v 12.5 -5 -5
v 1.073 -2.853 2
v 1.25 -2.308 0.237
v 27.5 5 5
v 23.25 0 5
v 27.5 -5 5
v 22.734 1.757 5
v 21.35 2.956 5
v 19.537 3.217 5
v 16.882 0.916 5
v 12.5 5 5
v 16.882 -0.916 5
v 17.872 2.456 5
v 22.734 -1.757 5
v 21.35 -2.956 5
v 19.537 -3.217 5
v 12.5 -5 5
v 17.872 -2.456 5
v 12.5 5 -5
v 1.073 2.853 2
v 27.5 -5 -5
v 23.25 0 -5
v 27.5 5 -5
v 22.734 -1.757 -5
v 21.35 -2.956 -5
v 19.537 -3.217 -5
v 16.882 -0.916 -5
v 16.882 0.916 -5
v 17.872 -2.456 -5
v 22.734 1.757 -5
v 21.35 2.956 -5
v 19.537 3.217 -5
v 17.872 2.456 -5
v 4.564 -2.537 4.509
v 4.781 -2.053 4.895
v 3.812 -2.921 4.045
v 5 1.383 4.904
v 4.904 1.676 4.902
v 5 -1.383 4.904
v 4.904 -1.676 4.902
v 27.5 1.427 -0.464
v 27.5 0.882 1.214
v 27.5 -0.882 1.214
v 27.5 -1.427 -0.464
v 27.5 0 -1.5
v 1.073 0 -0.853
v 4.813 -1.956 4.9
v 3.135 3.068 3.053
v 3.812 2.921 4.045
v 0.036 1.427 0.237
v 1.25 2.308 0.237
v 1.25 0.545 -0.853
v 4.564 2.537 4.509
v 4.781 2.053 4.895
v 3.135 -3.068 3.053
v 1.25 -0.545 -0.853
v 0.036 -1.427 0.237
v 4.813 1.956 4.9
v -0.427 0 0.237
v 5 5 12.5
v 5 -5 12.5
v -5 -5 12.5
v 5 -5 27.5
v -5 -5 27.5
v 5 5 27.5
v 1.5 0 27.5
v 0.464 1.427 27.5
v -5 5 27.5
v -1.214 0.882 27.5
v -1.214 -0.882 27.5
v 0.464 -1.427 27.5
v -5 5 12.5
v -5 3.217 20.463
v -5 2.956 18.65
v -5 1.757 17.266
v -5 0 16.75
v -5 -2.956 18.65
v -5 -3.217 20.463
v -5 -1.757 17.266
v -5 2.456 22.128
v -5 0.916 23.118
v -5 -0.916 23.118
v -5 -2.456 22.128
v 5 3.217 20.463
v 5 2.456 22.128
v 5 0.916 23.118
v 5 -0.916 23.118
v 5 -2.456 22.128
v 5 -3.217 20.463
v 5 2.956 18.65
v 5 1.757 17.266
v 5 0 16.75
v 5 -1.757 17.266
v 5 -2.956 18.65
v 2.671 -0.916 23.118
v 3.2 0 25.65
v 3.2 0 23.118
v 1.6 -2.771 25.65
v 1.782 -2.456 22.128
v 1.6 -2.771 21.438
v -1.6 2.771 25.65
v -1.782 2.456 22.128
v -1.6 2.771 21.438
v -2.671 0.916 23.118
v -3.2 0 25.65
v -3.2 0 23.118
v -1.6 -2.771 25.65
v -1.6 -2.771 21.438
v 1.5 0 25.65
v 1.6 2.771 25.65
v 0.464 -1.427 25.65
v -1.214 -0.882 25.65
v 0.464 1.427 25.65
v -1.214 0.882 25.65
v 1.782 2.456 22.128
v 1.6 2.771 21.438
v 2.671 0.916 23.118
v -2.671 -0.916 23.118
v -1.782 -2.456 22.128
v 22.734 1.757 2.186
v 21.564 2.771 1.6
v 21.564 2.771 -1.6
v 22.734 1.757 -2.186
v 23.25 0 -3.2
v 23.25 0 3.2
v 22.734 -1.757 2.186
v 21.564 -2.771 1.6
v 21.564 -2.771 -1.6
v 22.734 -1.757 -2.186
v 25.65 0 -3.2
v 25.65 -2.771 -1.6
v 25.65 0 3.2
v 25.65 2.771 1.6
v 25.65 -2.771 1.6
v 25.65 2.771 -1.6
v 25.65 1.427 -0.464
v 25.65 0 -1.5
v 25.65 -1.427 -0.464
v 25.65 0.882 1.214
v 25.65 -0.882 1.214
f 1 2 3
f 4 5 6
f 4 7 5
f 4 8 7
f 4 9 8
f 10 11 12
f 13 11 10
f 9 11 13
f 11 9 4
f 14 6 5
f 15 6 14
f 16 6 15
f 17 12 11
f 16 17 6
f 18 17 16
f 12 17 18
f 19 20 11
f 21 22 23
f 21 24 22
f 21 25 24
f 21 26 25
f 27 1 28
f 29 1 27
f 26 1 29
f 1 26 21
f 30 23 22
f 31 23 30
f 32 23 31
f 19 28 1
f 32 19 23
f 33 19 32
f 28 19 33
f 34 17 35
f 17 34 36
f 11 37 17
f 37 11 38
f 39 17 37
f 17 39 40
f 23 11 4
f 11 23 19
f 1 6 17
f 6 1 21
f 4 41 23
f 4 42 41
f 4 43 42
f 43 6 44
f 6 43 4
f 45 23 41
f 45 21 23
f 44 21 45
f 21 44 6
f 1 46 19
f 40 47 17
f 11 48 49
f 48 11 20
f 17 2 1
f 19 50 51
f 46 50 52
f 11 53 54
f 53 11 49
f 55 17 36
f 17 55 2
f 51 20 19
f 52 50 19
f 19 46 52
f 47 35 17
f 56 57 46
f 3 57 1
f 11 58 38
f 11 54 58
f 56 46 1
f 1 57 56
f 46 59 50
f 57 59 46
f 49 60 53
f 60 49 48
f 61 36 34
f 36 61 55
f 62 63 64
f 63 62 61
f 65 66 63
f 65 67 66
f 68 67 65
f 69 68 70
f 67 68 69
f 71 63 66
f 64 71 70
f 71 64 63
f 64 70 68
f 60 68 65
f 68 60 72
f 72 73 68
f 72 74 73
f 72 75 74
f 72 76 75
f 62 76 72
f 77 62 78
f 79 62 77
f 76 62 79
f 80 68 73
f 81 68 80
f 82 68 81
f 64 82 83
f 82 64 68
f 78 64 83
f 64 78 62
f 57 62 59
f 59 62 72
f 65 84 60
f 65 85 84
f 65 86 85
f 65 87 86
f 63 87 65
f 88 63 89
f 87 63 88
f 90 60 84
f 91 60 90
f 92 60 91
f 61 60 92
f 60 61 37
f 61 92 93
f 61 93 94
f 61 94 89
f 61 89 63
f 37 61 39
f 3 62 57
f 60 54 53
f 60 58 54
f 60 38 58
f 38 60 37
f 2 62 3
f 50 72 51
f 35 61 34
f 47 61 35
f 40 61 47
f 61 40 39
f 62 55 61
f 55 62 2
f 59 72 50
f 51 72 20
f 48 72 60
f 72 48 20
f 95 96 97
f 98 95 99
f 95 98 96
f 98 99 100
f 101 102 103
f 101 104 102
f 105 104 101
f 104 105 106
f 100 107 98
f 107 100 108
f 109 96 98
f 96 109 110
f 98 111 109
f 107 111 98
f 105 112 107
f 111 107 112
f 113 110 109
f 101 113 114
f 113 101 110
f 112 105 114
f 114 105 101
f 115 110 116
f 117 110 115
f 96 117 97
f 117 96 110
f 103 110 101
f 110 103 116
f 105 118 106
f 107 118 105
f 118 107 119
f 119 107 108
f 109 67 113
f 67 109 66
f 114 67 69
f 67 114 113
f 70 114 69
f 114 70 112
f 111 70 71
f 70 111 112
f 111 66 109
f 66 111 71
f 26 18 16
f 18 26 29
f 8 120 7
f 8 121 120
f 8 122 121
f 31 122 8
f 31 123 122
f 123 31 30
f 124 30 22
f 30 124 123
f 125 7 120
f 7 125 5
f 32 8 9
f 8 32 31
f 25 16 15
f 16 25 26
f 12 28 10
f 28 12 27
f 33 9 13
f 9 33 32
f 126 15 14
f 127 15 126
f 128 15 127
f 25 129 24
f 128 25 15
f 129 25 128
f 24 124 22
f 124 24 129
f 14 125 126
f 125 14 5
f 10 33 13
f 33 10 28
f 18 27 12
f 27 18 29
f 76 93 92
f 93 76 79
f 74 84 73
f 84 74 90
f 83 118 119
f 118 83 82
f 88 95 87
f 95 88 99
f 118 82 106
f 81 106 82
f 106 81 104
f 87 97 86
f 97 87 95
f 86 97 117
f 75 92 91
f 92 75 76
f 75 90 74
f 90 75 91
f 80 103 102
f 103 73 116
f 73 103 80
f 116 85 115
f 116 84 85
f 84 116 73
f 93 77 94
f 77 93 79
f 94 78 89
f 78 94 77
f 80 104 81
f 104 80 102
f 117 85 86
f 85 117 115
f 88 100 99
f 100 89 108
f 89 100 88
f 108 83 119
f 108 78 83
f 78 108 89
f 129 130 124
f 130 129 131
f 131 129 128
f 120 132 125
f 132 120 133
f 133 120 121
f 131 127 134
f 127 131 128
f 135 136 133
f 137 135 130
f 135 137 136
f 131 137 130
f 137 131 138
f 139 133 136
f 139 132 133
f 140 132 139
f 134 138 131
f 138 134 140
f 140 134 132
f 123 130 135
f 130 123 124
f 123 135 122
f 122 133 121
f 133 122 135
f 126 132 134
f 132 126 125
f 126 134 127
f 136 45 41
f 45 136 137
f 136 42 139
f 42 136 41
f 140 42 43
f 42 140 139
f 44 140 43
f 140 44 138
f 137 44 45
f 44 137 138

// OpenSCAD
use <MCAD/nuts_and_bolts.scad>

guiding_length = 10;
x = 2;
space = 15;


difference(){
union(){
	hull(){
	translate([space +guiding_length/2,0,0]) cube(size=[15,10,guiding_length], center = true);
	translate([x, 0, x]) sphere(3);
	}

	hull(){
		translate([0,0,space+guiding_length/2]) rotate([0,90,0])cube(size=[15,10,guiding_length], center = true);
		translate([x, 0, x]) sphere(3);
	}
}

	translate([space +guiding_length/2,0,0]) cylinder(r=3.25, h=10*guiding_length, center = true);
	translate([0,0,space+guiding_length/2]) rotate([0,90,0])cylinder(r=3.25, h=10*guiding_length, center = true);

//space for nut
	rotate([0,-90,0])
union(){translate([space +guiding_length/2+4.5,0, 0]) rotate([0,90,0]) translate([0,0,-1.25])  nutHole(3);
 translate([space +guiding_length/2+2.5,0, 0]) rotate([0,90,0]) translate([0,0,-1.25]) nutHole(3);

	translate([space +guiding_length/2+5,0, 0]) rotate([0,90,0]) cylinder(r=1.5, h=15, center=true);}

	translate([space +guiding_length/2+4.5,0, 0]) rotate([0,90,0]) translate([0,0,-1.25])  nutHole(3);
	translate([space +guiding_length/2+2.5,0, 0]) rotate([0,90,0]) translate([0,0,-1.25])  nutHole(3);
	translate([space +guiding_length/2+5,0, 0]) rotate([0,90,0]) cylinder(r=1.5, h=15, center=true);

//Cube to visualize
	//cube(space +guiding_length/2+7);

}

//cube(size=[sqrt(guiding_length
